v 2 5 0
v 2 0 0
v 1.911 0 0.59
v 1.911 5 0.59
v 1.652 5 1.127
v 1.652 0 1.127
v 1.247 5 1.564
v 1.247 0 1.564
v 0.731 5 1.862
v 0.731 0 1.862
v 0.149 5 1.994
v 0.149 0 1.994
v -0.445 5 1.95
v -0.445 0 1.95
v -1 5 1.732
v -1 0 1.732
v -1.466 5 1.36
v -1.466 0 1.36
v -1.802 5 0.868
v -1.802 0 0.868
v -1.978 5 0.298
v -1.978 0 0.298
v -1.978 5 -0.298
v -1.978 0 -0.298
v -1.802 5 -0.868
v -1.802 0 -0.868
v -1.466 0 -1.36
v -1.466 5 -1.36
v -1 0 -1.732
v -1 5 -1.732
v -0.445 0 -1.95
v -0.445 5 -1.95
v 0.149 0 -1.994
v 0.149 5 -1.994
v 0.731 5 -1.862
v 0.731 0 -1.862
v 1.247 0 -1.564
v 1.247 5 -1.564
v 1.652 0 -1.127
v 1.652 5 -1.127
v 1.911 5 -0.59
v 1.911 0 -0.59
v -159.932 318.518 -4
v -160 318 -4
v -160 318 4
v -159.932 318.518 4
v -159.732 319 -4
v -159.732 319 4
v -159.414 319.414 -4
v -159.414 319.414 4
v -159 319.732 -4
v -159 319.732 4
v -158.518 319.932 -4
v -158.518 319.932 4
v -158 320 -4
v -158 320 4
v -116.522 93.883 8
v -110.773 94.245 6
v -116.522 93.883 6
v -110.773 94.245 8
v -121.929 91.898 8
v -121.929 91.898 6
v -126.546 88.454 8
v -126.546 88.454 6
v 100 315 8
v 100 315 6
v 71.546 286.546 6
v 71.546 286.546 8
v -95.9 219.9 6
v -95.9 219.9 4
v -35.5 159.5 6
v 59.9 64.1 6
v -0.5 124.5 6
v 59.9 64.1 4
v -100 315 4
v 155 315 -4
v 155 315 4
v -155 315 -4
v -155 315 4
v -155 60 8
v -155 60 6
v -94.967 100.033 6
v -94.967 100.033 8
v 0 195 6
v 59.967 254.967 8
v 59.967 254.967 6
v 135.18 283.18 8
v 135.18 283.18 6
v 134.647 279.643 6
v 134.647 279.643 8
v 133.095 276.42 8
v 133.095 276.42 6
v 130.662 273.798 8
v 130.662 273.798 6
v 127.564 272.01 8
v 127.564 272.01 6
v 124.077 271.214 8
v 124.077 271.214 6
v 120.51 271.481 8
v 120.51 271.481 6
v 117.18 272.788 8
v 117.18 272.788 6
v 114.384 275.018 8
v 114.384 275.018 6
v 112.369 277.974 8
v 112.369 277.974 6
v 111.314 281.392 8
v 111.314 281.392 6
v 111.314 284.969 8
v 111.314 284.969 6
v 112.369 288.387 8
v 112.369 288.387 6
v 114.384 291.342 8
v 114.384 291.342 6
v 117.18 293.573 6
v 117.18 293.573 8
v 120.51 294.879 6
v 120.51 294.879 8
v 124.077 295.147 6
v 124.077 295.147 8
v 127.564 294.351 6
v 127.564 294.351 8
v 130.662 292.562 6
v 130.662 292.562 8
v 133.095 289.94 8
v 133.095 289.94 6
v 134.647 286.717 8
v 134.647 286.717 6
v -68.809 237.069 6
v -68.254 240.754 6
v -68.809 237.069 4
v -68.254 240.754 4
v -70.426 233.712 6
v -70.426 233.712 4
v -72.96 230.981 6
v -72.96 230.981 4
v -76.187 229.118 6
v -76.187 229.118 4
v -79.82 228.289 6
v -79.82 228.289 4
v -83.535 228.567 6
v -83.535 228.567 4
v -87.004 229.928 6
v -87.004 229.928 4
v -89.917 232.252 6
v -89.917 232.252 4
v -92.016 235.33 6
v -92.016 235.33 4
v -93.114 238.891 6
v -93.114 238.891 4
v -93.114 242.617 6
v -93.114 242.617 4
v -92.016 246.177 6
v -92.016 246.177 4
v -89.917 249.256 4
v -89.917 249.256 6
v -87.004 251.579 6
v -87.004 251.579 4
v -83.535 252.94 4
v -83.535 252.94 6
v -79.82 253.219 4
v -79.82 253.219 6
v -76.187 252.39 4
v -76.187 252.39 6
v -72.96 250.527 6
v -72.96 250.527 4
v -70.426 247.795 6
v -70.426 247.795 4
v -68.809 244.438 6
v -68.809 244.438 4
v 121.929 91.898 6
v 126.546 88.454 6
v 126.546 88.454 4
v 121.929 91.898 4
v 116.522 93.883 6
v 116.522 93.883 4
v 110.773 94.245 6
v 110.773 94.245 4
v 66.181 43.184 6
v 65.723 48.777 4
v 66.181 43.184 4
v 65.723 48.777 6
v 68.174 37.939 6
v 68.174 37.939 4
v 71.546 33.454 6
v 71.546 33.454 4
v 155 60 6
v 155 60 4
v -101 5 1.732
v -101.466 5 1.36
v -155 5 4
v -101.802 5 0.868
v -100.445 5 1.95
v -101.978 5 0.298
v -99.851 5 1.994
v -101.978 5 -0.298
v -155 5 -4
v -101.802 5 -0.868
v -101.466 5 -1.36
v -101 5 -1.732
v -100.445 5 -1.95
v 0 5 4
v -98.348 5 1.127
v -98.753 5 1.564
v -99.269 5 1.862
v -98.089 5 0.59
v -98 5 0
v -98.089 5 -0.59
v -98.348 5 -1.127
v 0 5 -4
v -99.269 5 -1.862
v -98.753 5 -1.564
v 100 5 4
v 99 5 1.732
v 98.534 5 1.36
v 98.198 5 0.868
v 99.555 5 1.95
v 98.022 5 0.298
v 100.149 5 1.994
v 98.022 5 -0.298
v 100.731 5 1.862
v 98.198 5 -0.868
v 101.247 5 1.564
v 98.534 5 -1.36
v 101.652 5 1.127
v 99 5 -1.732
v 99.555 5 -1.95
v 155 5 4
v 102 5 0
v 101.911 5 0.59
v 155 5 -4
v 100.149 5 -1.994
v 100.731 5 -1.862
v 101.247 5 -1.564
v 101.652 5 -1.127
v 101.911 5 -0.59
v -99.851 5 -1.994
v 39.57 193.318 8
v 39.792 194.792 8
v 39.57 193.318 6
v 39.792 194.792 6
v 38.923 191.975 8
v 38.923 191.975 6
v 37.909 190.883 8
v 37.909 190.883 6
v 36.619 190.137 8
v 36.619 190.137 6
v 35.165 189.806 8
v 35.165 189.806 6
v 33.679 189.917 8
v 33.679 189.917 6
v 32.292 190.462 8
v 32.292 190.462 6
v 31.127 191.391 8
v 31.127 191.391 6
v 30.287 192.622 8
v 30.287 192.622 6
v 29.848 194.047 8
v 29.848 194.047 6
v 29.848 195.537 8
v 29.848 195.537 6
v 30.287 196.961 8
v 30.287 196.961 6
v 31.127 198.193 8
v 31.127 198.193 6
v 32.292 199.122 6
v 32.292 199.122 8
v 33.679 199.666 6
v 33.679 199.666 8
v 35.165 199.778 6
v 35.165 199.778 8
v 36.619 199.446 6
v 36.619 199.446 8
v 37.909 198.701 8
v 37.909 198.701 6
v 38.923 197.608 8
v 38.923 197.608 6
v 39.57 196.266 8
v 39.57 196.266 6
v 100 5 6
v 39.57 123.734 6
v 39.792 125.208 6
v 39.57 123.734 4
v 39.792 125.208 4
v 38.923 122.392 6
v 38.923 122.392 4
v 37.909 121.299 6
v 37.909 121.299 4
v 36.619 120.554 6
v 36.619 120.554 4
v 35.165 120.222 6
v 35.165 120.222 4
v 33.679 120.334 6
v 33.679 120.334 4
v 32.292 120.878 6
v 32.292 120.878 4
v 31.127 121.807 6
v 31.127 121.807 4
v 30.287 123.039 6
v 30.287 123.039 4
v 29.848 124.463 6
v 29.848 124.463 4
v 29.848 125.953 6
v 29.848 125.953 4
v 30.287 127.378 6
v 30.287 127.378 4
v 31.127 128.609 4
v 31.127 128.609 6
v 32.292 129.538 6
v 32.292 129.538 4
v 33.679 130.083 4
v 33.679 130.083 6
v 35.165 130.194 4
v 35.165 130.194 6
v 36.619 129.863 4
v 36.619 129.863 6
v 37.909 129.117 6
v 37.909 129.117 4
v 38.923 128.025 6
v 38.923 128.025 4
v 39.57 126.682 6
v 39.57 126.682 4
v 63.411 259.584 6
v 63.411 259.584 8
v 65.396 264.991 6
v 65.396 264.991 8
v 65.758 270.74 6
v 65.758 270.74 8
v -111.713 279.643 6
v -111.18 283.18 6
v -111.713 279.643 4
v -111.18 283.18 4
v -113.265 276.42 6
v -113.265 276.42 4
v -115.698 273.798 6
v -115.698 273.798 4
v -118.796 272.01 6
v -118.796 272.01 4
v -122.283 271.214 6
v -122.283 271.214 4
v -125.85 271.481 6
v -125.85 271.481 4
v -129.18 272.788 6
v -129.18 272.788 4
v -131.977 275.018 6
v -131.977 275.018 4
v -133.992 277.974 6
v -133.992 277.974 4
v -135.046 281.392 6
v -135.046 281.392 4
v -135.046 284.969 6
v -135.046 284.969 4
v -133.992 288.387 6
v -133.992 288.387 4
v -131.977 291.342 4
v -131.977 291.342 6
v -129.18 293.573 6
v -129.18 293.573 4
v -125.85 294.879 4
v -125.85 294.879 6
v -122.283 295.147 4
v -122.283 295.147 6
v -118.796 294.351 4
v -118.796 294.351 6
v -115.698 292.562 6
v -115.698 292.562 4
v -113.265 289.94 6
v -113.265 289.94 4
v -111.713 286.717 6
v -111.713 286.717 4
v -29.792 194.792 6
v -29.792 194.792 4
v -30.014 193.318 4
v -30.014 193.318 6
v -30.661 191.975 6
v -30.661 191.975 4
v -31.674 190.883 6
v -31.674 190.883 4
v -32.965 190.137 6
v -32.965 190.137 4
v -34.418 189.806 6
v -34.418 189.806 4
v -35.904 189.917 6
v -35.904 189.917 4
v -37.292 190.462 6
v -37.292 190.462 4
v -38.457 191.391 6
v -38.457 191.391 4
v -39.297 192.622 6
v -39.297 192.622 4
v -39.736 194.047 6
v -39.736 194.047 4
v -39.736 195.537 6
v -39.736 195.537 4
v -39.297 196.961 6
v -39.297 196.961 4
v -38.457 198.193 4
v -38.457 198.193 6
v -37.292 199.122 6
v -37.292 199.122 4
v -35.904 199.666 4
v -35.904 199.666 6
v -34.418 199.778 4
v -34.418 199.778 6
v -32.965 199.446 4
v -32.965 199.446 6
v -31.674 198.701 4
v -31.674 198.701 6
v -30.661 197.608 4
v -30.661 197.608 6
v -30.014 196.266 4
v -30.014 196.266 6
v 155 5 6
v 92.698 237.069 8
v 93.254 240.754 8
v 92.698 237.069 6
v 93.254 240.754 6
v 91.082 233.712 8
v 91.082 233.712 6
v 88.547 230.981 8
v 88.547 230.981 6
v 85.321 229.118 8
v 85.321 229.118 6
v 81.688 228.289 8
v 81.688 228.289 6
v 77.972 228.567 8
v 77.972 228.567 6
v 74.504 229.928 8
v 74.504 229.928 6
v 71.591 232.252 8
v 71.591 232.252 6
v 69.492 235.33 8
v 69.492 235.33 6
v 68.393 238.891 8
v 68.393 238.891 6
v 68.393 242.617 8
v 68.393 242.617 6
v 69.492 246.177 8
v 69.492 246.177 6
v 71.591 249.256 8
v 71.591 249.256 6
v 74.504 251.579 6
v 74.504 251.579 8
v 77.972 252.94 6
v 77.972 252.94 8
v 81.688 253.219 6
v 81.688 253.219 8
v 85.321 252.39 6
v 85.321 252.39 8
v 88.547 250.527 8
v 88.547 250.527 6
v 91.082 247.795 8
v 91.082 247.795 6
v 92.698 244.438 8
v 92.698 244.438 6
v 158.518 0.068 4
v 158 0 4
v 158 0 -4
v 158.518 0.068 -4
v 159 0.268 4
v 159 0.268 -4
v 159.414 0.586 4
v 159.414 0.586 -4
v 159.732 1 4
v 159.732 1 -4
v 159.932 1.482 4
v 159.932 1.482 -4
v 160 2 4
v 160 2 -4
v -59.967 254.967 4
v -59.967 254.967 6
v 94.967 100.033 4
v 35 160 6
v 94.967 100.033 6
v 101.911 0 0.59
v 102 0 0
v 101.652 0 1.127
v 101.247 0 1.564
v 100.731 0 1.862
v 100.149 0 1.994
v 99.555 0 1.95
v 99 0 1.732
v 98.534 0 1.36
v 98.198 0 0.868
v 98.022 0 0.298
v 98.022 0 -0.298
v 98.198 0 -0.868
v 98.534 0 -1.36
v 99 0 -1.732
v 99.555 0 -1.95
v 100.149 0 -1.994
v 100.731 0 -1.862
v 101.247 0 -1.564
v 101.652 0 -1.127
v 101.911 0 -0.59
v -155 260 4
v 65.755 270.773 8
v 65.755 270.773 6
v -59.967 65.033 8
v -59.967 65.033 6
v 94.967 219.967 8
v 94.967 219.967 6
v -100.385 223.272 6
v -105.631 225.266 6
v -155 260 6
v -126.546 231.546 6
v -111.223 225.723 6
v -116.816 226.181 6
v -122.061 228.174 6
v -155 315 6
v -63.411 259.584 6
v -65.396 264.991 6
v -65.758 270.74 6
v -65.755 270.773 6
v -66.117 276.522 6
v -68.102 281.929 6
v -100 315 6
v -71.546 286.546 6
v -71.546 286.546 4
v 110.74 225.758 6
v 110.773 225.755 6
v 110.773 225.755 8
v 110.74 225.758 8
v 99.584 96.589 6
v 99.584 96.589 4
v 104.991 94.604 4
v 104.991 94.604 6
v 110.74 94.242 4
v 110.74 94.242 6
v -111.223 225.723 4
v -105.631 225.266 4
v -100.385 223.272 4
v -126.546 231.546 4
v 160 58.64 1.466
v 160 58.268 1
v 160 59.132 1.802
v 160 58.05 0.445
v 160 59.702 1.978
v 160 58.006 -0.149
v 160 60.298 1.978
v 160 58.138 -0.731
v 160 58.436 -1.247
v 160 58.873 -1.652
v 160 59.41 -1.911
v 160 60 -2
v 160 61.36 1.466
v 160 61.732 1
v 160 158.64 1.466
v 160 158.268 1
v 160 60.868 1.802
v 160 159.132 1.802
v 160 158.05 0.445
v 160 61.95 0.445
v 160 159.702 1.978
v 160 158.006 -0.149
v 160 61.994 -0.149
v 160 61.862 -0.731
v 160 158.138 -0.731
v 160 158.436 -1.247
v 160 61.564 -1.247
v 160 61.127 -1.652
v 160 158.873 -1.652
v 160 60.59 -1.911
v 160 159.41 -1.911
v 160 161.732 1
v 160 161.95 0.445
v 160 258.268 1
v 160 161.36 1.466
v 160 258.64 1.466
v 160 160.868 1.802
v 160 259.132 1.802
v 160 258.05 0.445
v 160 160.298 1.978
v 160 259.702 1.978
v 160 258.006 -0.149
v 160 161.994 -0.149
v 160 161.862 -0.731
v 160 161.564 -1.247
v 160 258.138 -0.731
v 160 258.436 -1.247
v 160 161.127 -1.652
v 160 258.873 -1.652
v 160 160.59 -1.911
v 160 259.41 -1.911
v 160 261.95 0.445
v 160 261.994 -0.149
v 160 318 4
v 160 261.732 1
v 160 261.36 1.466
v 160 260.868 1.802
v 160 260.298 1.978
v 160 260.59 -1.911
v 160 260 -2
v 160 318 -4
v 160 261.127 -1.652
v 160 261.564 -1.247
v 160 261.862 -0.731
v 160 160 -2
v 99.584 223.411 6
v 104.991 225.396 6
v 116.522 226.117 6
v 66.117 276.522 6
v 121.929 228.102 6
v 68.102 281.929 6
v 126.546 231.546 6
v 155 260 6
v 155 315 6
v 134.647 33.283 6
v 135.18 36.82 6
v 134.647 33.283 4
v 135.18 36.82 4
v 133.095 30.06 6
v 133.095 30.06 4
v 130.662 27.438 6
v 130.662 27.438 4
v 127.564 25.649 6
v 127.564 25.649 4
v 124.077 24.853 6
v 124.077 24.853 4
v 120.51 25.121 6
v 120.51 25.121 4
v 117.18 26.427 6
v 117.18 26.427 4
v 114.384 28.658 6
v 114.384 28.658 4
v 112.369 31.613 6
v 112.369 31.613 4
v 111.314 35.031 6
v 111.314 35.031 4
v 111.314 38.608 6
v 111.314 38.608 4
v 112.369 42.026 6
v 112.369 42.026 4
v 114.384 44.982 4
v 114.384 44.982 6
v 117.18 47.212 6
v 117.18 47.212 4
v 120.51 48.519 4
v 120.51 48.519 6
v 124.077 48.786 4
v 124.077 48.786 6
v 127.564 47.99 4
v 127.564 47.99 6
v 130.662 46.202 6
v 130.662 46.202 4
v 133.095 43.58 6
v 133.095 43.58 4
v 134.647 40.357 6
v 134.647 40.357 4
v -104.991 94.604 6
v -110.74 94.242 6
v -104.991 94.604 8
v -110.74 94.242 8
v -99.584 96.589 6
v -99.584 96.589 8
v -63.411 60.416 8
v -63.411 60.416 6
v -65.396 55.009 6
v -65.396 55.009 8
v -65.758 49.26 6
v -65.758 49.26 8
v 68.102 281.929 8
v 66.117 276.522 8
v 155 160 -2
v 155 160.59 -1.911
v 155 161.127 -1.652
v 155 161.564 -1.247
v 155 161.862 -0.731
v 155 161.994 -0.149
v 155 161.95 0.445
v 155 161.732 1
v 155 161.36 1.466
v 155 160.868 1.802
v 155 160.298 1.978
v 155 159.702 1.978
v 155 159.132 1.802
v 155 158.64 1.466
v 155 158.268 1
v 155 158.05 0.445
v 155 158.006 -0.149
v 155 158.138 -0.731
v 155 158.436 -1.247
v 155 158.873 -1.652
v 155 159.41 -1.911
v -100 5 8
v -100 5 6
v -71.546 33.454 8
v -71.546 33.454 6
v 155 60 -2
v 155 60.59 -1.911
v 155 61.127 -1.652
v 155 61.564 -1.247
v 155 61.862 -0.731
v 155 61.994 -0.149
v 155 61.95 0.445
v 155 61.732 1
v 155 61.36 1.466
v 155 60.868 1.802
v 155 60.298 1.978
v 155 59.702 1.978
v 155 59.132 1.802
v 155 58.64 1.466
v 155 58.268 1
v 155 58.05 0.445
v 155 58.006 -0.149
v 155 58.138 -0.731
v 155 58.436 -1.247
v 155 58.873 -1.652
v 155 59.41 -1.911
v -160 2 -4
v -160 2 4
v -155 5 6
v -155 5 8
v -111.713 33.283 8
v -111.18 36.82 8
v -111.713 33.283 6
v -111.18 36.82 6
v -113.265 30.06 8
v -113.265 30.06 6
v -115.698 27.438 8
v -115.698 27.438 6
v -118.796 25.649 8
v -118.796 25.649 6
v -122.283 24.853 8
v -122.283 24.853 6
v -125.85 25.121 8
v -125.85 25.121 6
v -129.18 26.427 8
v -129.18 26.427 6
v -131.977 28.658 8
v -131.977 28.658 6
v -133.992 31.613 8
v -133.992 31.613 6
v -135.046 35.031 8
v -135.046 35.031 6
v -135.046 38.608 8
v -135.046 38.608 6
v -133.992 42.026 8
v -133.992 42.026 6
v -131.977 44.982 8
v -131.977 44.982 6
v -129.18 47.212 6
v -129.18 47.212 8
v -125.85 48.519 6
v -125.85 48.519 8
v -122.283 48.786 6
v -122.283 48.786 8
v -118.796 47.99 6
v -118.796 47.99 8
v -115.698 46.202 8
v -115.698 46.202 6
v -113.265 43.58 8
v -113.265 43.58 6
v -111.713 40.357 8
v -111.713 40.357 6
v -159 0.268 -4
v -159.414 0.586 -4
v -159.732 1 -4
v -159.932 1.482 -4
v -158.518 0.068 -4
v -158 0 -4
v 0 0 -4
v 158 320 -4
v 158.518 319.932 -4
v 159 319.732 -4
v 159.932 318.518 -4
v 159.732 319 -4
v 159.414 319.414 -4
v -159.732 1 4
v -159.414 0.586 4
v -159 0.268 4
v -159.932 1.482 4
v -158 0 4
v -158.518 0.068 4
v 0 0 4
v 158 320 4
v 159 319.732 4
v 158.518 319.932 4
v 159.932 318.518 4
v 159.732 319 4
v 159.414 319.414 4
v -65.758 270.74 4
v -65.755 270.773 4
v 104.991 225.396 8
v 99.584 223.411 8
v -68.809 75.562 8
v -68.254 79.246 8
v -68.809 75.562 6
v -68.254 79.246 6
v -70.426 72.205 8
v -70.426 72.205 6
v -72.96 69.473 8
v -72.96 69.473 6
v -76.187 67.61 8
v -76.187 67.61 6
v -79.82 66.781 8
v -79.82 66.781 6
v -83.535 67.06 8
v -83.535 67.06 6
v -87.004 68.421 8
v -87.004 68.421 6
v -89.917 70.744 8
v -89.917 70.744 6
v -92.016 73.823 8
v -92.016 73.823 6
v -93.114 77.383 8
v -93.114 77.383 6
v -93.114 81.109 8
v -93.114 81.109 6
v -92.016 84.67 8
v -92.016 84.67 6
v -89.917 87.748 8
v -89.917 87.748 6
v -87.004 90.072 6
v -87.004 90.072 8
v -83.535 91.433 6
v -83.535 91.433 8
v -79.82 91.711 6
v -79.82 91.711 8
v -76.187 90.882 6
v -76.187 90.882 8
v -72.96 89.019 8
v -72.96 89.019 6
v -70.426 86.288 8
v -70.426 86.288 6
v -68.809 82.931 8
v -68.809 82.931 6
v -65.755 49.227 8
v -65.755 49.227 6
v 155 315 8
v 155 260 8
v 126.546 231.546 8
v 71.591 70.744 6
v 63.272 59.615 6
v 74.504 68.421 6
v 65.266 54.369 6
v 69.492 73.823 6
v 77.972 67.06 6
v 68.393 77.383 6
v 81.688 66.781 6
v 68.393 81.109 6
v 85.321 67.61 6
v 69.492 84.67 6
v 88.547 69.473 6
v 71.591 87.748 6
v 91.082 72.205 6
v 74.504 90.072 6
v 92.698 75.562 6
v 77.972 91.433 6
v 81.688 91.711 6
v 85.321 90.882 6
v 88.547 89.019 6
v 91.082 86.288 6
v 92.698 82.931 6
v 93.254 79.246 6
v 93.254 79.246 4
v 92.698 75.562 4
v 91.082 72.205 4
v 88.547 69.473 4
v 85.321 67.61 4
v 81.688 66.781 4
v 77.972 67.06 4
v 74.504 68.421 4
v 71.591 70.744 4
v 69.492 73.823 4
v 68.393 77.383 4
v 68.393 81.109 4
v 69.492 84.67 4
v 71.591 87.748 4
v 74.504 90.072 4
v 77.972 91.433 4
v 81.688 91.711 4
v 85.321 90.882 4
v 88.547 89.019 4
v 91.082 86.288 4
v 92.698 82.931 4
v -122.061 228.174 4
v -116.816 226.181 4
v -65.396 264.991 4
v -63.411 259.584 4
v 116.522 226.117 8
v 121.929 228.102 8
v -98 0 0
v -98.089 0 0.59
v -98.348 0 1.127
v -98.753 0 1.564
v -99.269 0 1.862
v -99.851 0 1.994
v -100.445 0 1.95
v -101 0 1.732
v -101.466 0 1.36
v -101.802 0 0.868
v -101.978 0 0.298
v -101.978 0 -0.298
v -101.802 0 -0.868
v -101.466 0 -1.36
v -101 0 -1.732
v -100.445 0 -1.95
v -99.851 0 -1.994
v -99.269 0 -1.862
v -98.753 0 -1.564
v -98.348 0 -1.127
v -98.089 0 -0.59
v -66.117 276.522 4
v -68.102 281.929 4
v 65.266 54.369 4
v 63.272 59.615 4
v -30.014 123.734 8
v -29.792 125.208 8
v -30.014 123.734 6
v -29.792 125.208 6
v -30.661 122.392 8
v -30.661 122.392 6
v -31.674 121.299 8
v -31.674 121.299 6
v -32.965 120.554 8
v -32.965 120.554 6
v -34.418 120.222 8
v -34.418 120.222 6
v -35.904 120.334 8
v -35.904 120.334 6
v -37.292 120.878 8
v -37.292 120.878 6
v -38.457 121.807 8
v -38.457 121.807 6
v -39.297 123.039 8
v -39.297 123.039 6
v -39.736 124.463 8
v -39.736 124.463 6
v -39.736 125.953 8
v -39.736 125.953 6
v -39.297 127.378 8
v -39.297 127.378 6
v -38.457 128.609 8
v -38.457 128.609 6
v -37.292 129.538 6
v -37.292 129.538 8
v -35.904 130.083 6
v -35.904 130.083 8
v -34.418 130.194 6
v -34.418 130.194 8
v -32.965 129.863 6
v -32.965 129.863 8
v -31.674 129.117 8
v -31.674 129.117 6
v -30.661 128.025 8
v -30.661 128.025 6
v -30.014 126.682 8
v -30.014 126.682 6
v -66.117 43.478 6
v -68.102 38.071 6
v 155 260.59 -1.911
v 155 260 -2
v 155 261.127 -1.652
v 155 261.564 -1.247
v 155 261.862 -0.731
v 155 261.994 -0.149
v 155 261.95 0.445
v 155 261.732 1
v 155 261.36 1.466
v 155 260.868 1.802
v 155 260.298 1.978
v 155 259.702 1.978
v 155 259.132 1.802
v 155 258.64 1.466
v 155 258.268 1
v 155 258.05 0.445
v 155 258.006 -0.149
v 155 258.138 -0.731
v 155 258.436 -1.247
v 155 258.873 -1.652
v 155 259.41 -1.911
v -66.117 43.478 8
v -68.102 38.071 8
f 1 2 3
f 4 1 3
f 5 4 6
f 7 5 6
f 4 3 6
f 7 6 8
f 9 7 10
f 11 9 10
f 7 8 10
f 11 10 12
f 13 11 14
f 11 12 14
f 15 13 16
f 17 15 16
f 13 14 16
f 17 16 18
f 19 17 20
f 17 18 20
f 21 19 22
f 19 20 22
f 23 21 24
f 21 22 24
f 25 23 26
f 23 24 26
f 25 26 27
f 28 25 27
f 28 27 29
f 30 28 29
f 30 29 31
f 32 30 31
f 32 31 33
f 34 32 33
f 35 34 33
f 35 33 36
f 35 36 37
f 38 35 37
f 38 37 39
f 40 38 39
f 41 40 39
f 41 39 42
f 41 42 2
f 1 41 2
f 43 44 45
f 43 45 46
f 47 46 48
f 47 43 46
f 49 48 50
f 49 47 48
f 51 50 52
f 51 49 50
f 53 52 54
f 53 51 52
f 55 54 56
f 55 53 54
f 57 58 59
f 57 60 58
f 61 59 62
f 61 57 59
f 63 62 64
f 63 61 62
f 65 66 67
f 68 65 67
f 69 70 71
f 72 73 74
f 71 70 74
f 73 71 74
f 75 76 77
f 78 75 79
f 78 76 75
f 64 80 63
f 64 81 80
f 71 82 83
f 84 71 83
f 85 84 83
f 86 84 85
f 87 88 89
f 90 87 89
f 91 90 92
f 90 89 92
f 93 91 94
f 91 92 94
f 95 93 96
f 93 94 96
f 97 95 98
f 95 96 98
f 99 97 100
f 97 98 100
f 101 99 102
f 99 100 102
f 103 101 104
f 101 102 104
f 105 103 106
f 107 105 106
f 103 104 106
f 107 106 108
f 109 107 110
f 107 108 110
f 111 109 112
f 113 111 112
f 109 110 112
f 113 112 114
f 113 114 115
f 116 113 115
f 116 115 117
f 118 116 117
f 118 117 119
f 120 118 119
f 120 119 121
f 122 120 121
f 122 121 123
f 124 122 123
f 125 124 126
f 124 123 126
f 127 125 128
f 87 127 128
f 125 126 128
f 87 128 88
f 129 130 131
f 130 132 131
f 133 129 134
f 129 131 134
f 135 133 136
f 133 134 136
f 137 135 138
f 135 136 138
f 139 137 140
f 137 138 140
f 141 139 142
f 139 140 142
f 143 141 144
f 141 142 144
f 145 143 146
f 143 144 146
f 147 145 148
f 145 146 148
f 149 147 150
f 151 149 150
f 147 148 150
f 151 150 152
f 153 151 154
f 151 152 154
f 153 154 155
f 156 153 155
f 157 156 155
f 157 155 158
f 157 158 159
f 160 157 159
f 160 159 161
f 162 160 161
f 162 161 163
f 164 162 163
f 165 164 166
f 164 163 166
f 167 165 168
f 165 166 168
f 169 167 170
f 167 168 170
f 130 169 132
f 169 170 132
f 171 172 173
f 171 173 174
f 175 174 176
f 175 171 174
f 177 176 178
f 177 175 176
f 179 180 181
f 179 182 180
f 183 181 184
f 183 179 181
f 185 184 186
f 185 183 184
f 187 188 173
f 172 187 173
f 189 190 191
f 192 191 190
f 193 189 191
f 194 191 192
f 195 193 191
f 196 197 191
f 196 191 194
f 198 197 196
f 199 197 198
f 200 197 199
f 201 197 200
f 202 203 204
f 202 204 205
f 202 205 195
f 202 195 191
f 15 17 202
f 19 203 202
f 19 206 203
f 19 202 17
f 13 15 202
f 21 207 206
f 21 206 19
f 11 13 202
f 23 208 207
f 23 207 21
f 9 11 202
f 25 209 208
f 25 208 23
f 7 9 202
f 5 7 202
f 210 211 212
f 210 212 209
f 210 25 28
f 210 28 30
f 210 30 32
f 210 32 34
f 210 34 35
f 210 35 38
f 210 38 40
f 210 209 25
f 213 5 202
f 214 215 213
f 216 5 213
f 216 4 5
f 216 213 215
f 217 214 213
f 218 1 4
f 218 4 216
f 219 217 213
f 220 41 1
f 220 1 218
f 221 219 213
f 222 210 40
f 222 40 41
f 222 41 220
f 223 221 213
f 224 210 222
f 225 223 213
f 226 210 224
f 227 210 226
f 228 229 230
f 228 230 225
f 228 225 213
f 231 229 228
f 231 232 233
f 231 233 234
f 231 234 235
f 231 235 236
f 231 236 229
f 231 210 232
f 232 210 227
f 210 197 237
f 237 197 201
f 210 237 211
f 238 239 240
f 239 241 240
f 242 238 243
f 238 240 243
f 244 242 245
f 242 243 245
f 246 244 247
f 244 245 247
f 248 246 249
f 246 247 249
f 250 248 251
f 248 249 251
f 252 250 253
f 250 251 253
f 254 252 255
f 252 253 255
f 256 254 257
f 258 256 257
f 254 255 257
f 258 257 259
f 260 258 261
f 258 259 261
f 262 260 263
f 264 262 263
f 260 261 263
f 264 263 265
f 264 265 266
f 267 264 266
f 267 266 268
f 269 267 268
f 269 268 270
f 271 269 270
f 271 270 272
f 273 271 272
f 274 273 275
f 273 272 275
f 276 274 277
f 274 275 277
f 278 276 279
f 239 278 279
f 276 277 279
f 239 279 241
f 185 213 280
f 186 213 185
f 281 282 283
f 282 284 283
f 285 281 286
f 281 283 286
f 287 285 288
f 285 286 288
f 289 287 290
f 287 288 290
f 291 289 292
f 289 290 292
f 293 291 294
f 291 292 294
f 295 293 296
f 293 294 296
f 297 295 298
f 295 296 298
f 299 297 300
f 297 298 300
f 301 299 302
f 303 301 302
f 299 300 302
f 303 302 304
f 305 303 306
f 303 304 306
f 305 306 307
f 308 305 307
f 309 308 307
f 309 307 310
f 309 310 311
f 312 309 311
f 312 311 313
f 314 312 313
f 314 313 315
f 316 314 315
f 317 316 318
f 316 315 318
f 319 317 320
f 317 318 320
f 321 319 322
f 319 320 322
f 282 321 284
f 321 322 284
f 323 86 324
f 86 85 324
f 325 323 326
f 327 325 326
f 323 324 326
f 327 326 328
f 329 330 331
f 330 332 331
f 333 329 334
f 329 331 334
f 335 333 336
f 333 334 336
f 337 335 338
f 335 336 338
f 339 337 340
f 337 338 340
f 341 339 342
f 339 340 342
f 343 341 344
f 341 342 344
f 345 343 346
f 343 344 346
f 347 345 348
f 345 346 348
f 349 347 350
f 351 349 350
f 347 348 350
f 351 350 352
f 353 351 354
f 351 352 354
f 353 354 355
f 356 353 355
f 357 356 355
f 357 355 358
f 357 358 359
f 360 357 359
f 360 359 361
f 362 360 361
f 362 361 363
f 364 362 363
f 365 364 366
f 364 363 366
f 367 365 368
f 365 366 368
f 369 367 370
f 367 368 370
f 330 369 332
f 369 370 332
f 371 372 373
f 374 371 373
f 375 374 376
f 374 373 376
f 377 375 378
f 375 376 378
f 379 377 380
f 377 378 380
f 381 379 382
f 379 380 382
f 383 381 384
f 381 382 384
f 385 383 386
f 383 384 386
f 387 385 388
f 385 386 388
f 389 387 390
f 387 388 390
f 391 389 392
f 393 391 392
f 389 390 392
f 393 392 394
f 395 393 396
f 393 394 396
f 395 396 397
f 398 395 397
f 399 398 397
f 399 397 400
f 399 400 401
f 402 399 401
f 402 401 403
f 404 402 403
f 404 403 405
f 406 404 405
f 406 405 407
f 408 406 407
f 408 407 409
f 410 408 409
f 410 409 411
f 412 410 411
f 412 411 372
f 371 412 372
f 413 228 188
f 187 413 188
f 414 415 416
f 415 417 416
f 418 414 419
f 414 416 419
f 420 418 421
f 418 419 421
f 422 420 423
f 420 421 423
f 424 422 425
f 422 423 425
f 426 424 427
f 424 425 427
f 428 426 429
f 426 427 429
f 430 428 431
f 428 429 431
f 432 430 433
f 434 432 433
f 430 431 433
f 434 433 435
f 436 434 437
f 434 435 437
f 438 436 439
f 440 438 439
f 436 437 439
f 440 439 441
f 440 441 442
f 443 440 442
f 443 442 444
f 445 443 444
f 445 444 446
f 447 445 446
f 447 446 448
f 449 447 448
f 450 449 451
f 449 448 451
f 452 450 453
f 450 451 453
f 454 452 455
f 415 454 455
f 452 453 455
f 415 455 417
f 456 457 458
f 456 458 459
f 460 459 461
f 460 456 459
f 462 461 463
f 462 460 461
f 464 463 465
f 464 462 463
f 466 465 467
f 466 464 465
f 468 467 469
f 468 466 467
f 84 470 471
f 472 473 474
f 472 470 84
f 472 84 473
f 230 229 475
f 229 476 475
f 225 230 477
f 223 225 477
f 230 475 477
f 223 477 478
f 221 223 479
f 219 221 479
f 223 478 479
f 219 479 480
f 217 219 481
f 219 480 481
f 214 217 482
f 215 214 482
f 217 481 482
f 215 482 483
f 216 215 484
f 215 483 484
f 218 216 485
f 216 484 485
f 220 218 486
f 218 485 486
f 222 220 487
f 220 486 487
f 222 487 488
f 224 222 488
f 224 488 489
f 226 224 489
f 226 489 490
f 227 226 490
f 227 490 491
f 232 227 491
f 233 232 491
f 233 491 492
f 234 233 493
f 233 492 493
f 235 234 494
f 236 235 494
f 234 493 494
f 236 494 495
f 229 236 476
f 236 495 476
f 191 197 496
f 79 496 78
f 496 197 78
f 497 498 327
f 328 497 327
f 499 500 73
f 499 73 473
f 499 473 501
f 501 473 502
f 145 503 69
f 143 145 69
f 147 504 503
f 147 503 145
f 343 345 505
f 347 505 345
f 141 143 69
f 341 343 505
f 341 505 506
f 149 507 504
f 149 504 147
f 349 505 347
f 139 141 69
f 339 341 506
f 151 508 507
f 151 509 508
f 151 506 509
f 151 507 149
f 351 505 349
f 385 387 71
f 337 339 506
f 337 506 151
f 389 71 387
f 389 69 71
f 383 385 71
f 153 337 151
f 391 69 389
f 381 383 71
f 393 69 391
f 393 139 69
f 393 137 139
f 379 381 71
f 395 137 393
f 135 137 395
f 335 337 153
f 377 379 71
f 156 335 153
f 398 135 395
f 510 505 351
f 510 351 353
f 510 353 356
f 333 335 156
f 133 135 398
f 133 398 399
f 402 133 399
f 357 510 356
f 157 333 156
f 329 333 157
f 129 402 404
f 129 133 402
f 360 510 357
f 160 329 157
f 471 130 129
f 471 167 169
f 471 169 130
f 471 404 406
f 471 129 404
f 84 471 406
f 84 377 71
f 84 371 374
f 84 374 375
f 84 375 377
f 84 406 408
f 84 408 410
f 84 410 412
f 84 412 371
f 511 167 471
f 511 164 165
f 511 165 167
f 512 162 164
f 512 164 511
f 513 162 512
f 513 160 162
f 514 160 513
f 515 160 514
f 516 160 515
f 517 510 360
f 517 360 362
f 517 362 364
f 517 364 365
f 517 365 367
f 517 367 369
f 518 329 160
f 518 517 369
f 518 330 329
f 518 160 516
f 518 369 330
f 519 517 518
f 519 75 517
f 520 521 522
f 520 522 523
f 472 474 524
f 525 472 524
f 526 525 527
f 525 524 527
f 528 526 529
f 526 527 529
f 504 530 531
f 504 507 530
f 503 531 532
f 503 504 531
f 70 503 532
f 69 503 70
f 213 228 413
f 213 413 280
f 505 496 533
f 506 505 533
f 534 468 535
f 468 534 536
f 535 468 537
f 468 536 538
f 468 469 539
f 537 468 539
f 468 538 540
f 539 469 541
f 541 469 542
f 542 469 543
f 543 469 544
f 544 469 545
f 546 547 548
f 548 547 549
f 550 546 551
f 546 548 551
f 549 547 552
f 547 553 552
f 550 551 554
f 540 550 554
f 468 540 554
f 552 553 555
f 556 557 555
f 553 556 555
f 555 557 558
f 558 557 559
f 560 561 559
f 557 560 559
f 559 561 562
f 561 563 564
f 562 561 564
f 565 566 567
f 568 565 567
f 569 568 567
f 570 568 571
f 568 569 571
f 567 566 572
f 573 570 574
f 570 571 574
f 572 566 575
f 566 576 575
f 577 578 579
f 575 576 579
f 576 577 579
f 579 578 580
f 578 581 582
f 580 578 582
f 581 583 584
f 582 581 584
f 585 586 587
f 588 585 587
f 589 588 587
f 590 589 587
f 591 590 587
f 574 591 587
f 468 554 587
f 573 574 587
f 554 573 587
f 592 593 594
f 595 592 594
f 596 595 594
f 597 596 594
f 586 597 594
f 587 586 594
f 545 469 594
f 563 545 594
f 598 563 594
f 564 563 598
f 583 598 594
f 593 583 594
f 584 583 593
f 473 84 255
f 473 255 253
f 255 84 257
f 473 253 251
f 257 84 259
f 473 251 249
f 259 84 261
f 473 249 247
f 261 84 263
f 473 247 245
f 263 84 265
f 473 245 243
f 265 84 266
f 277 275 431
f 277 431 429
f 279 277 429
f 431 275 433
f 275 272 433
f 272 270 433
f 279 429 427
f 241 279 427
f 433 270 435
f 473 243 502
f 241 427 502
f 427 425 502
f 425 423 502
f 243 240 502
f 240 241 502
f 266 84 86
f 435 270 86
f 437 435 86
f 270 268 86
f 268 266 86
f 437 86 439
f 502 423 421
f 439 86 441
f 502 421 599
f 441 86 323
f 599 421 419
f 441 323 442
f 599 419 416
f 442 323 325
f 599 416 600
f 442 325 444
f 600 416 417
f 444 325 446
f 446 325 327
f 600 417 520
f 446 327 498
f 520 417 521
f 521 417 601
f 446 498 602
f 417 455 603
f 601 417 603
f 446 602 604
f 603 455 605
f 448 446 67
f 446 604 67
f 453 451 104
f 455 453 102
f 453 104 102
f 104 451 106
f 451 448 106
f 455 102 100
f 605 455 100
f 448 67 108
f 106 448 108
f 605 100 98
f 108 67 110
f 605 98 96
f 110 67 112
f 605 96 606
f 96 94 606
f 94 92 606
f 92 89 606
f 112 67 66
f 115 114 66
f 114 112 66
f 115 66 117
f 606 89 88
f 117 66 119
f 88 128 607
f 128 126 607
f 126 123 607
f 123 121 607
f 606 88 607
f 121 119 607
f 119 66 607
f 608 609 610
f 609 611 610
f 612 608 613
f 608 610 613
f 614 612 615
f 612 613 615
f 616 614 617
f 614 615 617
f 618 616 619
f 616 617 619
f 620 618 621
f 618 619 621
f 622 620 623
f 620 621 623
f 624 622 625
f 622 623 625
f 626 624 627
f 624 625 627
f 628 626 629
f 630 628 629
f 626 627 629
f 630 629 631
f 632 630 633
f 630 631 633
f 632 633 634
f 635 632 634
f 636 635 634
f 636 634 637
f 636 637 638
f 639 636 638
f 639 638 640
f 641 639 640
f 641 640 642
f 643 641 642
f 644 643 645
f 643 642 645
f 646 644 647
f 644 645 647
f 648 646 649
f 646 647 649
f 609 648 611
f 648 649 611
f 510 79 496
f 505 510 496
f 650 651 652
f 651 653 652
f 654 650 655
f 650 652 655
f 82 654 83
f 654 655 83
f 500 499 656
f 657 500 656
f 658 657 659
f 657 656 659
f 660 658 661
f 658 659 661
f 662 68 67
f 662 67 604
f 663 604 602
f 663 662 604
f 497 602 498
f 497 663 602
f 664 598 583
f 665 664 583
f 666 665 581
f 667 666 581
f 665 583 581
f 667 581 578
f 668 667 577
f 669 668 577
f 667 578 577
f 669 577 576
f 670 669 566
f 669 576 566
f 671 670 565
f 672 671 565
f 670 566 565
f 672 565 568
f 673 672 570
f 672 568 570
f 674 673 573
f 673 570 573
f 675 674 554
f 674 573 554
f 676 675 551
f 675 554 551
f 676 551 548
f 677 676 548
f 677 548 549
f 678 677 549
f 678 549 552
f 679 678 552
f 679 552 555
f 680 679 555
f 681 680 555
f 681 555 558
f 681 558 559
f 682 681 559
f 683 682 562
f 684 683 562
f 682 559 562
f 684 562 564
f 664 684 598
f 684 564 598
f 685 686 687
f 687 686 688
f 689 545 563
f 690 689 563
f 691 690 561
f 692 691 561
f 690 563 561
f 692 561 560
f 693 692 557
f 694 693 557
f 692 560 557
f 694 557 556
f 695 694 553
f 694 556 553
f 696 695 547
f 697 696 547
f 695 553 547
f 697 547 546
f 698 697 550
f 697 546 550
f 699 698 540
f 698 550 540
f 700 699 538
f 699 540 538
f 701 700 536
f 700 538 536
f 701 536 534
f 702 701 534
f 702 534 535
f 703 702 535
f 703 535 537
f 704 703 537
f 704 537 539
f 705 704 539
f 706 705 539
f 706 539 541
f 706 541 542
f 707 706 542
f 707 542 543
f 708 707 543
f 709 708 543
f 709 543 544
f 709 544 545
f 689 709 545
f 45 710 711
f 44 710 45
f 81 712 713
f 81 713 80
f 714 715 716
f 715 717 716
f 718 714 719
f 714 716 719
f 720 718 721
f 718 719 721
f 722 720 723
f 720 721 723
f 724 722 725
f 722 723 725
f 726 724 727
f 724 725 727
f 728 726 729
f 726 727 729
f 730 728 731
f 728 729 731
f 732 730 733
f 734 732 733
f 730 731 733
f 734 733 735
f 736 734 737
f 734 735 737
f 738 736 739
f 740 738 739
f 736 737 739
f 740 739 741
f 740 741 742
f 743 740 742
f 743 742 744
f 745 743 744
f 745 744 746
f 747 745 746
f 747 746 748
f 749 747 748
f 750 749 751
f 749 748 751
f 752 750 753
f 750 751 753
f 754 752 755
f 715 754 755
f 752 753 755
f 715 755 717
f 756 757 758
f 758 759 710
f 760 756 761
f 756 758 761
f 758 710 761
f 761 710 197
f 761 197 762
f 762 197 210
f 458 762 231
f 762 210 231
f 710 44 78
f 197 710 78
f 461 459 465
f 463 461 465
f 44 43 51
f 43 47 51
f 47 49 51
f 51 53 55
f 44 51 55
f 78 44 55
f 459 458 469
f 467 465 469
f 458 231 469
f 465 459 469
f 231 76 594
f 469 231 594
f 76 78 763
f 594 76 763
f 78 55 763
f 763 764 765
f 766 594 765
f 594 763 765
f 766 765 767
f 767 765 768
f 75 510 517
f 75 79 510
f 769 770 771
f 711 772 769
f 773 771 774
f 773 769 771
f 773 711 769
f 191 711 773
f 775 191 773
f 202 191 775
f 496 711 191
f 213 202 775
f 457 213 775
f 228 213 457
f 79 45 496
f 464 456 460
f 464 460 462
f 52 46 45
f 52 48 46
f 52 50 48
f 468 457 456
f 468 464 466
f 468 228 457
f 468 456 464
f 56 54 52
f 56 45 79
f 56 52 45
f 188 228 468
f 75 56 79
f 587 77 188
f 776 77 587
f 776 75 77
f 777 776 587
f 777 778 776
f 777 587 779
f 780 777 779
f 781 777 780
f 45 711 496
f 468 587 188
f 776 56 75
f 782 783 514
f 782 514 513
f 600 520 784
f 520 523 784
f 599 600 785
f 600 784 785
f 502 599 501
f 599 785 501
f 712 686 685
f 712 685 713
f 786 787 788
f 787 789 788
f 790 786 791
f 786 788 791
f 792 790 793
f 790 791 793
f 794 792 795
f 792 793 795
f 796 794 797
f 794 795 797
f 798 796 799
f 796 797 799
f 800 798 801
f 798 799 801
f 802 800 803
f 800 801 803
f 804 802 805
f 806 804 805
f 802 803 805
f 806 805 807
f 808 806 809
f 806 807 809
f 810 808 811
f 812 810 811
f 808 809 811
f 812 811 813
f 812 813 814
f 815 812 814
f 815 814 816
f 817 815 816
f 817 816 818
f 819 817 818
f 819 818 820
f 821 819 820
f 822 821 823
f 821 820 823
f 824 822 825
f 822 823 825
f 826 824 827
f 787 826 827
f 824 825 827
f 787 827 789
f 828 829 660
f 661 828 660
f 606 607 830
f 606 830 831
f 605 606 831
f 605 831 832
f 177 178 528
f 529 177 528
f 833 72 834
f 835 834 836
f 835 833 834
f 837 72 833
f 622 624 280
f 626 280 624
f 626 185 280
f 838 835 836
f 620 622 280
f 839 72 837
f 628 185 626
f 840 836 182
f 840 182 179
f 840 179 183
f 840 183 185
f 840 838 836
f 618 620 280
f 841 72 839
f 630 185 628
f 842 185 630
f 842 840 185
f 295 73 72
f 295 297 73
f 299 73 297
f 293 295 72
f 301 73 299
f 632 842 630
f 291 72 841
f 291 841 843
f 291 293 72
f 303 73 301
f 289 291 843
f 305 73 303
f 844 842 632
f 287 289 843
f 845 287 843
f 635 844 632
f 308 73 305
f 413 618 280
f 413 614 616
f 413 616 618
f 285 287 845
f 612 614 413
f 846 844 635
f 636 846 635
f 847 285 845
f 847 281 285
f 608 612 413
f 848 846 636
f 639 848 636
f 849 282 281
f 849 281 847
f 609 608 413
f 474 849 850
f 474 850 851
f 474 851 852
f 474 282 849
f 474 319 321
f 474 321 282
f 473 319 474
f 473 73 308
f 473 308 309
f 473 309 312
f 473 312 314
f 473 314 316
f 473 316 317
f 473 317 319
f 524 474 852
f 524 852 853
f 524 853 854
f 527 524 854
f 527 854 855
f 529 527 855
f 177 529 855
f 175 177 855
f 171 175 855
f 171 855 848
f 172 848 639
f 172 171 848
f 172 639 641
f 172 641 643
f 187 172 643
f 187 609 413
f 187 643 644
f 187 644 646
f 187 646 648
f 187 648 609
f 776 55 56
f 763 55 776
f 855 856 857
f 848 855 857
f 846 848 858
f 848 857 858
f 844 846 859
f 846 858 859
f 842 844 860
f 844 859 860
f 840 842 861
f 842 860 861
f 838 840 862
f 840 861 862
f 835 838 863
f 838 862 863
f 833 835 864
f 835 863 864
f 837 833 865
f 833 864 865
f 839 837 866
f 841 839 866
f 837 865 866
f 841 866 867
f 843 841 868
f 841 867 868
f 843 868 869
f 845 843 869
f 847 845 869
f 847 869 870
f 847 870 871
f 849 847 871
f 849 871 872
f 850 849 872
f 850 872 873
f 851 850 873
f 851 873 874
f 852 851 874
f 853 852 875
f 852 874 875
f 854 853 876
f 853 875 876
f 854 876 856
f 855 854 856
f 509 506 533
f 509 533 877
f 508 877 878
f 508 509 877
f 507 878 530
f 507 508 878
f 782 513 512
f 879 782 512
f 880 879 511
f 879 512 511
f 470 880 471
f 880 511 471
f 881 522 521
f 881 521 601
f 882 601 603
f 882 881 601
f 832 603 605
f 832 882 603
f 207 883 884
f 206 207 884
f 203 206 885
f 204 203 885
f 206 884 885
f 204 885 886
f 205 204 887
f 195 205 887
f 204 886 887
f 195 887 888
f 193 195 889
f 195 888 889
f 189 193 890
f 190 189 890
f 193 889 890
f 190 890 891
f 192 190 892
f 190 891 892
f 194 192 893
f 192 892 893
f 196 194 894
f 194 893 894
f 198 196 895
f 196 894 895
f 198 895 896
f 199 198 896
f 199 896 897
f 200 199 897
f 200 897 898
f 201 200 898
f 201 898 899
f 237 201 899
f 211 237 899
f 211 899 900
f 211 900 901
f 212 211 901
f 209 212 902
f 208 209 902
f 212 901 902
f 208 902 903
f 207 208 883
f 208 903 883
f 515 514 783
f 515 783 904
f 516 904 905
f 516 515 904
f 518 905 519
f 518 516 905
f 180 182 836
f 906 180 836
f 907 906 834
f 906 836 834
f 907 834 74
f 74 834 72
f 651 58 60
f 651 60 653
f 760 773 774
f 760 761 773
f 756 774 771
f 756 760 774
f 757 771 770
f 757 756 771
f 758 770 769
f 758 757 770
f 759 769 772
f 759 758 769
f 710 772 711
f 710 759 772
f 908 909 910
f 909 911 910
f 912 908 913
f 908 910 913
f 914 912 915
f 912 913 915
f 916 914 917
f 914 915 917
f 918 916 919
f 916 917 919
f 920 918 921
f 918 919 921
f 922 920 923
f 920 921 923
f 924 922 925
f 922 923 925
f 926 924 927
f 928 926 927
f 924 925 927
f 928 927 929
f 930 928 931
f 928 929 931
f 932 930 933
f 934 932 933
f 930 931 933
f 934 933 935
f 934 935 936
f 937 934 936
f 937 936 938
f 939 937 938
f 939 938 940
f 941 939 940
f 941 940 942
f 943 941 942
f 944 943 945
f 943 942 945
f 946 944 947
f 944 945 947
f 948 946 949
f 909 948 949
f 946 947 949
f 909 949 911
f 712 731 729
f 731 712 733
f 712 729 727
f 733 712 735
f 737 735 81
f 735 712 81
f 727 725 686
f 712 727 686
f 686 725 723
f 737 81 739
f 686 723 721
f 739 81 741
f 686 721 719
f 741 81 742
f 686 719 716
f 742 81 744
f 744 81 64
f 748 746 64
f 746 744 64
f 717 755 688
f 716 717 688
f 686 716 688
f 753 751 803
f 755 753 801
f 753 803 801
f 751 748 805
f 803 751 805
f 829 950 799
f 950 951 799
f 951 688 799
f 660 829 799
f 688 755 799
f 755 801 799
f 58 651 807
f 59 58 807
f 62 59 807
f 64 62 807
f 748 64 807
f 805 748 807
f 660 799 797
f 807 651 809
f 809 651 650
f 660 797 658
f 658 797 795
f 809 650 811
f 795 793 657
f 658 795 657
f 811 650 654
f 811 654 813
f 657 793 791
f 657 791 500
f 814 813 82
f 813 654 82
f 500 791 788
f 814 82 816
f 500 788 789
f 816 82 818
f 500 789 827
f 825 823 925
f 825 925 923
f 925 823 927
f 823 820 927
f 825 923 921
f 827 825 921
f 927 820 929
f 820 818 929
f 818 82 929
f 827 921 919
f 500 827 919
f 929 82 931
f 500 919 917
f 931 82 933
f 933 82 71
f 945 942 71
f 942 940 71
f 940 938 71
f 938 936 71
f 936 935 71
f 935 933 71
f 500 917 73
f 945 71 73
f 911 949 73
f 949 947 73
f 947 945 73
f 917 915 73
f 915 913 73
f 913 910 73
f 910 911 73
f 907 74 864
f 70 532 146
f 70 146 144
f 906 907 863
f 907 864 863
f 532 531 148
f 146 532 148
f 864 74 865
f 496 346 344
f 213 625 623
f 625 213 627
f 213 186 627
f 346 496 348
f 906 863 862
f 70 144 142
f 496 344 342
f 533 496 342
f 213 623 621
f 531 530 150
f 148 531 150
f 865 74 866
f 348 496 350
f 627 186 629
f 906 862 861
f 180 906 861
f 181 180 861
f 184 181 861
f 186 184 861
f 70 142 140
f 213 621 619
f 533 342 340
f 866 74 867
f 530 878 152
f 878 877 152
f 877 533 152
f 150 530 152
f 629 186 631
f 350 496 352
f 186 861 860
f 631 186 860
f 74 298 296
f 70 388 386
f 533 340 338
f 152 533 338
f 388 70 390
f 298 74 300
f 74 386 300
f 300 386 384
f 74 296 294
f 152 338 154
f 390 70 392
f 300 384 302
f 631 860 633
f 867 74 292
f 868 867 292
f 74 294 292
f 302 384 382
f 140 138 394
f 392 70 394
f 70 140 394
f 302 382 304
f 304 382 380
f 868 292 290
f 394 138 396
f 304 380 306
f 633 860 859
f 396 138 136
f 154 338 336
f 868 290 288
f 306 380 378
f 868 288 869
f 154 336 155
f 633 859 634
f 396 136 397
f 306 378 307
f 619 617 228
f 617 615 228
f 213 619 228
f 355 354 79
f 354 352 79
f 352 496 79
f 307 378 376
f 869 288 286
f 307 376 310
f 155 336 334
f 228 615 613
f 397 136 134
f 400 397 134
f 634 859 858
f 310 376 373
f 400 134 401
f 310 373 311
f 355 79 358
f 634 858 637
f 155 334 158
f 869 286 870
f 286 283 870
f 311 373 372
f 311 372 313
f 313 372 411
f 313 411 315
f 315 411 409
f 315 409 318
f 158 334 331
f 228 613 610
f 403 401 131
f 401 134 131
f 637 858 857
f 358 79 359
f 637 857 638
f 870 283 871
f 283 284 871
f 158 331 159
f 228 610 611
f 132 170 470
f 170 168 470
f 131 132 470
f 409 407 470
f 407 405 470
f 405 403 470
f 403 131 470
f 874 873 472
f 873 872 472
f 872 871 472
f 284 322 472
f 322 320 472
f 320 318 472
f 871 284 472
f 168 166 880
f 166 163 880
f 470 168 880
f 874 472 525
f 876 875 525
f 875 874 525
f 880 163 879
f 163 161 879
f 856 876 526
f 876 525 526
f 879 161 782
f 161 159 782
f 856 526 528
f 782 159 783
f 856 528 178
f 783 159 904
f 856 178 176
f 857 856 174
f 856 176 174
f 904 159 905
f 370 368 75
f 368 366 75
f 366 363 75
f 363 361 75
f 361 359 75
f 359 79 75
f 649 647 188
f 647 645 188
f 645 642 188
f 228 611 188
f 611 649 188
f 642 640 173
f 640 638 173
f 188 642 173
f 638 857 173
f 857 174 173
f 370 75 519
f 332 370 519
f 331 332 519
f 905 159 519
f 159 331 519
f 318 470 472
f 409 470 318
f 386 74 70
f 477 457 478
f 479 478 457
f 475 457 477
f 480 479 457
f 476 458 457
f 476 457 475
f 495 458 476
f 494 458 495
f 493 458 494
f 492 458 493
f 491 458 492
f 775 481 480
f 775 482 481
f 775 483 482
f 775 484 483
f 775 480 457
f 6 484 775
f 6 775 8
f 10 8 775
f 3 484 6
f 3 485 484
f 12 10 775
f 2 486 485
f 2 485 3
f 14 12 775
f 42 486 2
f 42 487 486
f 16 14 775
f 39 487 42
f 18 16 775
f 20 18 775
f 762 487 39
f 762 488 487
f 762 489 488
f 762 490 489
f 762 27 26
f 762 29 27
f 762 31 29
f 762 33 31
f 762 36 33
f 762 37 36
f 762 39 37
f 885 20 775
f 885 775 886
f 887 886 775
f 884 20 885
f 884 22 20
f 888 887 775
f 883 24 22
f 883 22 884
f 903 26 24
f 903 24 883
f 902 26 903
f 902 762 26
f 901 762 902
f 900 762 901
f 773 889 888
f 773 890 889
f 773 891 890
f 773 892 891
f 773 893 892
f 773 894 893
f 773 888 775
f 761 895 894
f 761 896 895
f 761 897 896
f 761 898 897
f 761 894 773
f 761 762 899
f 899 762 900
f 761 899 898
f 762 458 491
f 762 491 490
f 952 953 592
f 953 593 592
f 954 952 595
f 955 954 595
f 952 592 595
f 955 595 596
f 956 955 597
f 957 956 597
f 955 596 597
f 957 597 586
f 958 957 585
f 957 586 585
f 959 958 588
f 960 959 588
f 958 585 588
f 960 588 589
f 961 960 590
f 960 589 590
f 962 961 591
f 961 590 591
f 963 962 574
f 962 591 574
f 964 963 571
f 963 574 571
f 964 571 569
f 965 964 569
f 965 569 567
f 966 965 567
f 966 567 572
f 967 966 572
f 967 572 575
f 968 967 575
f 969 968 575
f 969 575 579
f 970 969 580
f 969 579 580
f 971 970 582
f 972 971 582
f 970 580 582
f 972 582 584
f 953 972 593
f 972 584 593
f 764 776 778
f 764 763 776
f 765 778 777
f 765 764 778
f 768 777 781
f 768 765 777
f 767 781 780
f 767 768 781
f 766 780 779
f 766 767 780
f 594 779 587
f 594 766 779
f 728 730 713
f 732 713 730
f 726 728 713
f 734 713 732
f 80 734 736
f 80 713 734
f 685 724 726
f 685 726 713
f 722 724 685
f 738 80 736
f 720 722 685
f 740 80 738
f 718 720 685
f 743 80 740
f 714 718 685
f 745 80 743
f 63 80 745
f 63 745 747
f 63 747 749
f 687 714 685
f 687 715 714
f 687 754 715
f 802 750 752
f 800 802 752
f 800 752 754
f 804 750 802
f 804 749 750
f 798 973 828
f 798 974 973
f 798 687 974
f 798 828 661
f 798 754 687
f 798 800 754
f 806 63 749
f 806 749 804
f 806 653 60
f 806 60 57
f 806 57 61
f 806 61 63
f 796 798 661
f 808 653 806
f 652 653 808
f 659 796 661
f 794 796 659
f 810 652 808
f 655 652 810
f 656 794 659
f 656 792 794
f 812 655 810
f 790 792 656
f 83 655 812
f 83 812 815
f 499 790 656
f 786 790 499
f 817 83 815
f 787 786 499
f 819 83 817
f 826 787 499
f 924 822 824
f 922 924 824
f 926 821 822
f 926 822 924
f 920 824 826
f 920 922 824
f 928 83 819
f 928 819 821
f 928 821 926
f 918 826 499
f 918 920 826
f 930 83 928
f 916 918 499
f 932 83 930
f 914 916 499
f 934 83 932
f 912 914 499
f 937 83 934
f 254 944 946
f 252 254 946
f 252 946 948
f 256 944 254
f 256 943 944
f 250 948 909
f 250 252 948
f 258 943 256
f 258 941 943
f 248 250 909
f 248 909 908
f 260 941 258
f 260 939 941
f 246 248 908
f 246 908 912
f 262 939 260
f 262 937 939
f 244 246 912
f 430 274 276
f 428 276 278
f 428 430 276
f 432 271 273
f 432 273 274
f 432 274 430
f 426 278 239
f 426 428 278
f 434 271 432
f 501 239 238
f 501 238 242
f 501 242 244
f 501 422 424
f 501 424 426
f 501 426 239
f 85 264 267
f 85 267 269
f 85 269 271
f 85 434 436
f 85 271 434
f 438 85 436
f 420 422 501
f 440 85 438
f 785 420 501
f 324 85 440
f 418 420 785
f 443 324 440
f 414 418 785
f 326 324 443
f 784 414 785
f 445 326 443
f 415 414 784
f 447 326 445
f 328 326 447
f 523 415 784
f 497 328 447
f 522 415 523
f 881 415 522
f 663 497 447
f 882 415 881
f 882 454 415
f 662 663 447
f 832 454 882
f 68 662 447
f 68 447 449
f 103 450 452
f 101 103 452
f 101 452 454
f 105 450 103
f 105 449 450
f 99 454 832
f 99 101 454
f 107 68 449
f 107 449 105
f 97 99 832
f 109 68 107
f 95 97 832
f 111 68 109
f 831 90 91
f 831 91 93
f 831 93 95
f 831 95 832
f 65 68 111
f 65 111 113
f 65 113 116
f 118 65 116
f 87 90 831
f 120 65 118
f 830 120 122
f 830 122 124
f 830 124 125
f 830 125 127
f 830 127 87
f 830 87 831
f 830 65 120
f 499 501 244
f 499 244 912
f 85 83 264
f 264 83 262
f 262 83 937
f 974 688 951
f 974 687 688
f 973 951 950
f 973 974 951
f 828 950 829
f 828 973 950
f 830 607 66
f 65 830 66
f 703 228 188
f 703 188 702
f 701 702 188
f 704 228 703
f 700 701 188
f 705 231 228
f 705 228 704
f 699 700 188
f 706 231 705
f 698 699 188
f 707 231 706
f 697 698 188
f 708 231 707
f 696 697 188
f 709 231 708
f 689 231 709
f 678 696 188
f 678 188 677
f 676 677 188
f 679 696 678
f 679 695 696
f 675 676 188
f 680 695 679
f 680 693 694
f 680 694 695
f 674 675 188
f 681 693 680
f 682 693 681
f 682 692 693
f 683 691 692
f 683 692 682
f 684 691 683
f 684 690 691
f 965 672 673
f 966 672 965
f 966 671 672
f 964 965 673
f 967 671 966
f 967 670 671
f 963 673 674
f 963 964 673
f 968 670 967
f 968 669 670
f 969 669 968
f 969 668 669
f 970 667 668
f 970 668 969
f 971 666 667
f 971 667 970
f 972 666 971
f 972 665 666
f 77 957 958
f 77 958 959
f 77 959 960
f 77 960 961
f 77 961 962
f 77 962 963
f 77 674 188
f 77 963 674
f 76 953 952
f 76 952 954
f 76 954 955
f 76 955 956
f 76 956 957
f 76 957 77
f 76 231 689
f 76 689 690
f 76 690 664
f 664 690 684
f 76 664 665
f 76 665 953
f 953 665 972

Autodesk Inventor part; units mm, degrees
sketch "Sketch1" plane through (0, 0, 0) normal (0, 0, 1) x (1, 0, 0)
  line L0 (0, 1487) -> (0, 5) construction
  line L1 (0, 0) -> (160, 0)
  line L2 (160, 0) -> (160, 320)
  line L3 (160, 320) -> (0, 320)
  line L4 (0, 0) -> (5, 0)
  line L5 (0, 0) -> (0, 5)
  line L6 (0, 5) -> (155, 5)
  line L7 (155, 5) -> (155, 315)
  line L8 (155, 315) -> (0, 315)
  line L9 (0, 0) -> (-160, 0)
  line L10 (-160, 0) -> (-160, 320)
  line L11 (-160, 320) -> (0, 320)
  line L12 (0, 5) -> (-155, 5)
  line L13 (-155, 5) -> (-155, 315)
  line L14 (-155, 315) -> (0, 315)
  dimension "d12" = 160
  dimension "d13" = 320
  dimension "d14" = 5
  dimension "d15" = 5
  dimension "d19" = 310
  dimension "d20" = 155
  dimension "d21" = 1487
extrude "Extrusion2" add sketch "Sketch1" along normal mid plane 8
fillet "Fillet2" radius 2 4 edges at (160, 320, 0) (-160, 320, 0) (160, 0, 0) (-160, 0, 0)
ref_plane "Work Plane1" through (0, 0, 4) normal (0, 0, 1) x (1, 0, 0)
sketch "Sketch2" plane through (0, 0, 4) normal (0, 0, 1) x (1, 0, 0)
  line L0 (-155, 315) -> (155, 5)
  line L1 (-137.5, 332.5) -> (172.5, 22.5)
  line L2 (-173, 297) -> (137, -13)
  line L3 (-173, 297) -> (-137.5, 332.5)
  circle A0 centre (-123.1802, 283.1802) radius 12
  circle A1 centre (-80.7538, 240.7538) radius 12.5
  line L4 (137, -13) -> (172.5, 22.5)
  circle A2 centre (123.1802, 36.8198) radius 12
  circle A3 centre (80.7538, 79.2462) radius 12.5
  circle A4 centre (34.7918, 125.2082) radius 5
  circle A5 centre (-34.7918, 194.7918) radius 5
  line L5 (-155, 315) -> (-155, 5) projected
  line L6 (-155, 315) -> (-155, 260)
  line L7 (-155, 260) -> (-120, 225)
  line L8 (-155, 315) -> (-100, 315)
  line L9 (-155, 315) -> (155, 315) projected
  line L10 (-100, 315) -> (-65, 280)
  line L11 (155, 5) -> (-155, 5) projected
  line L12 (155, 5) -> (100, 5)
  line L13 (155, 5) -> (155, 60)
  line L14 (155, 315) -> (155, 5) projected
  line L15 (-65, 280) -> (-68.2954, 239.7342)
  line L16 (-120, 225) -> (-79.7342, 228.2954)
  line L17 (155, 60) -> (120, 95)
  line L18 (100, 5) -> (65, 40)
  line L19 (65, 40) -> (68.2954, 80.2658)
  line L20 (120, 95) -> (79.7342, 91.7046)
  line L21 (155, 60) -> (182.5, 32.5)
  line L22 (182.5, 32.5) -> (172.5, 22.5)
  line L23 (100, 5) -> (127.5, -22.5)
  line L24 (127.5, -22.5) -> (137, -13)
  line L25 (-100, 315) -> (-127.5, 342.5)
  line L26 (-127.5, 342.5) -> (-137.5, 332.5)
  line L27 (-173, 297) -> (-182.5, 287.5)
  line L28 (-182.5, 287.5) -> (-155, 260)
  point P0 (0, 0)
  point P1 (66.4374, 57.5626)
  point P2 (119, 5)
  point P3 (101.513, 93.487)
  point P4 (155, 40)
  point P5 (-66.513, 261.513)
  point P6 (-120, 315)
  point P7 (-102.4374, 226.4374)
  point P8 (-155, 279)
  dimension "d30" = 24.7487
  dimension "d31" = 25.4558
  dimension "d32" = 50.2046
  dimension "d33" = 24
  dimension "d34" = 25
  dimension "d35" = 45
  dimension "d36" = 105
  dimension "d37" = 24
  dimension "d38" = 25
  dimension "d39" = 45
  dimension "d40" = 35.5
  dimension "d41" = 105
  dimension "d42" = 438.4062
  dimension "d43" = 0
  dimension "d44" = 0
  dimension "d45" = 10
  dimension "d46" = 10
  dimension "d47" = 170
  dimension "d48" = 170
  dimension "d111" = 55
  dimension "d112" = 55
  dimension "d114" = 45
  dimension "d115" = 45
  dimension "d116" = 55
  dimension "d117" = 55
  dimension "d118" = 35
  dimension "d119" = 35
  dimension "d121" = 45
  dimension "d122" = 45
  dimension "d123" = 35
  dimension "d124" = 35
extrude "Extrusion3" add sketch "Sketch2" along normal blind 2 contours L8 L1 L15 A1 L0 A0 | L0 A0 A1 L16 L2 L5 | L2 L16 L7 L5 | L8 L10 L15 L1 | L16 A1 L0 A5 A4 A3 L19 L2 | L1 L20 A3 L0 A4 A5 A1 L15 | L19 A3 L0 A2 L11 L2 | L2 L11 L18 L19 | L20 L17 L13 L1 | L1 L13 L0 A2 A3 L20
ref_plane "Work Plane2" through (0, 0, 6) normal (0, 0, 1) x (1, 0, 0)
sketch "Sketch3" plane through (0, 0, 6) normal (0, 0, 1) x (1, 0, 0)
  line L0 (-155, 5) -> (155, 315)
  line L1 (-172.5, 22.5) -> (137.5, 332.5)
  line L2 (-137.5, -12.5) -> (172.5, 297.5)
  line L3 (-172.5, 22.5) -> (-137.5, -12.5)
  line L4 (137.5, 332.5) -> (172.5, 297.5)
  circle A0 centre (123.1802, 283.1802) radius 12
  circle A1 centre (80.7538, 240.7538) radius 12.5
  circle A2 centre (34.7918, 194.7918) radius 5
  circle A3 centre (-34.7918, 125.2082) radius 5
  circle A4 centre (-80.7538, 79.2462) radius 12.5
  circle A5 centre (-123.1802, 36.8198) radius 12
  line L5 (155, 315) -> (155, 60) projected
  line L6 (155, 315) -> (100, 315)
  line L7 (155, 315) -> (-155, 315) projected
  line L8 (100, 315) -> (65, 280)
  line L9 (65, 280) -> (68.2954, 239.7342)
  line L10 (155, 315) -> (155, 260)
  line L11 (155, 260) -> (120, 225)
  line L12 (120, 225) -> (79.7342, 228.2954)
  line L13 (-155, 5) -> (-155, 260) projected
  line L14 (-155, 5) -> (-155, 60)
  line L15 (-155, 60) -> (-120, 95)
  line L16 (100, 5) -> (-155, 5) projected
  line L17 (-155, 5) -> (-100, 5)
  line L18 (-100, 5) -> (-65, 40)
  line L19 (-65, 40) -> (-68.2954, 80.2658)
  line L20 (-120, 95) -> (-79.7342, 91.7046)
  point P0 (0, 0)
  point P1 (-68.2538, 79.2462)
  point P2 (66.513, 261.513)
  point P3 (-101.513, 93.487)
  point P4 (-66.513, 58.487)
  point P5 (101.513, 226.513)
  dimension "d55" = 24.7487
  dimension "d56" = 24.7487
  dimension "d57" = 24
  dimension "d58" = 25
  dimension "d59" = 10
  dimension "d60" = 45
  dimension "d61" = 35
  dimension "d62" = 105
  dimension "d63" = 170
  dimension "d64" = 45
  dimension "d65" = 105
  dimension "d66" = 170
  dimension "d67" = 438.4062
  dimension "d68" = 0
  dimension "d69" = 438.4062
  dimension "d125" = 55
  dimension "d126" = 55
  dimension "d127" = 45
  dimension "d128" = 35
  dimension "d129" = 45
  dimension "d130" = 35
  dimension "d131" = 55
  dimension "d132" = 55
  dimension "d133" = 45
  dimension "d134" = 35
  dimension "d135" = 45
  dimension "d136" = 35
extrude "Extrusion4" add sketch "Sketch3" along normal blind 2 contours L13 L1 L20 A4 L0 A5 | L0 A5 A4 L19 L2 L16 | L13 L15 L20 L1 | L2 L19 L18 L16 | L1 L9 A1 L0 A2 A3 A4 L20 | L19 A4 L0 A3 A2 A1 L12 L2 | L9 L8 L6 L1 | L1 L6 L0 A0 A1 L9 | L12 A1 L0 A0 L5 L2 | L2 L5 L11 L12
ref_plane "Work Plane4" through (160, 2, -4) normal (1, 0, 0) x (0, 0, -1)
sketch "Sketch5" plane through (160, 2, -4) normal (1, 0, 0) x (0, 0, -1)
  circle A0 centre (-4, 158) radius 2
  circle A1 centre (-4, 58) radius 2
  circle A2 centre (-4, 258) radius 2
  line L0 (0, 318) -> (-8, 318) projected
  point P0 (-4, -2)
  dimension "d84" = 4
  dimension "d85" = 4
  dimension "d86" = 4
  dimension "d87" = 60
  dimension "d88" = 100
  dimension "d89" = 100
  dimension "d90" = 60
extrude "Extrusion6" cut sketch "Sketch5" against normal blind 8
ref_plane "Work Plane6" through (-158, 0, -4) normal (0, -1, 0) x (1, 0, 0)
sketch "Sketch7" plane through (-158, 0, -4) normal (0, -1, 0) x (1, 0, 0)
  circle A0 centre (158, 4) radius 2
  circle A1 centre (258, 4) radius 2
  circle A2 centre (58, 4) radius 2
  dimension "d104" = 4
  dimension "d105" = 4
  dimension "d106" = 4
  dimension "d107" = 100
  dimension "d108" = 100
extrude "Extrusion8" cut sketch "Sketch7" against normal blind 8
fillet "Fillet3" radius 20 16 edges at (65, 40, 5) (66.4374, 57.5626, 5) (120, 95, 5) (101.513, 93.487, 5) (66.513, 261.513, 7) (65, 280, 7) (-120, 225, 5) (-102.4374, 226.4374, 5) (-101.513, 93.487, 7) (-120, 95, 7) (-66.513, 58.487, 7) (-65, 40, 7) (101.513, 226.513, 7) (120, 225, 7) (-65, 280, 5) (-66.513, 261.513, 5)
properties part number "Chassis"
